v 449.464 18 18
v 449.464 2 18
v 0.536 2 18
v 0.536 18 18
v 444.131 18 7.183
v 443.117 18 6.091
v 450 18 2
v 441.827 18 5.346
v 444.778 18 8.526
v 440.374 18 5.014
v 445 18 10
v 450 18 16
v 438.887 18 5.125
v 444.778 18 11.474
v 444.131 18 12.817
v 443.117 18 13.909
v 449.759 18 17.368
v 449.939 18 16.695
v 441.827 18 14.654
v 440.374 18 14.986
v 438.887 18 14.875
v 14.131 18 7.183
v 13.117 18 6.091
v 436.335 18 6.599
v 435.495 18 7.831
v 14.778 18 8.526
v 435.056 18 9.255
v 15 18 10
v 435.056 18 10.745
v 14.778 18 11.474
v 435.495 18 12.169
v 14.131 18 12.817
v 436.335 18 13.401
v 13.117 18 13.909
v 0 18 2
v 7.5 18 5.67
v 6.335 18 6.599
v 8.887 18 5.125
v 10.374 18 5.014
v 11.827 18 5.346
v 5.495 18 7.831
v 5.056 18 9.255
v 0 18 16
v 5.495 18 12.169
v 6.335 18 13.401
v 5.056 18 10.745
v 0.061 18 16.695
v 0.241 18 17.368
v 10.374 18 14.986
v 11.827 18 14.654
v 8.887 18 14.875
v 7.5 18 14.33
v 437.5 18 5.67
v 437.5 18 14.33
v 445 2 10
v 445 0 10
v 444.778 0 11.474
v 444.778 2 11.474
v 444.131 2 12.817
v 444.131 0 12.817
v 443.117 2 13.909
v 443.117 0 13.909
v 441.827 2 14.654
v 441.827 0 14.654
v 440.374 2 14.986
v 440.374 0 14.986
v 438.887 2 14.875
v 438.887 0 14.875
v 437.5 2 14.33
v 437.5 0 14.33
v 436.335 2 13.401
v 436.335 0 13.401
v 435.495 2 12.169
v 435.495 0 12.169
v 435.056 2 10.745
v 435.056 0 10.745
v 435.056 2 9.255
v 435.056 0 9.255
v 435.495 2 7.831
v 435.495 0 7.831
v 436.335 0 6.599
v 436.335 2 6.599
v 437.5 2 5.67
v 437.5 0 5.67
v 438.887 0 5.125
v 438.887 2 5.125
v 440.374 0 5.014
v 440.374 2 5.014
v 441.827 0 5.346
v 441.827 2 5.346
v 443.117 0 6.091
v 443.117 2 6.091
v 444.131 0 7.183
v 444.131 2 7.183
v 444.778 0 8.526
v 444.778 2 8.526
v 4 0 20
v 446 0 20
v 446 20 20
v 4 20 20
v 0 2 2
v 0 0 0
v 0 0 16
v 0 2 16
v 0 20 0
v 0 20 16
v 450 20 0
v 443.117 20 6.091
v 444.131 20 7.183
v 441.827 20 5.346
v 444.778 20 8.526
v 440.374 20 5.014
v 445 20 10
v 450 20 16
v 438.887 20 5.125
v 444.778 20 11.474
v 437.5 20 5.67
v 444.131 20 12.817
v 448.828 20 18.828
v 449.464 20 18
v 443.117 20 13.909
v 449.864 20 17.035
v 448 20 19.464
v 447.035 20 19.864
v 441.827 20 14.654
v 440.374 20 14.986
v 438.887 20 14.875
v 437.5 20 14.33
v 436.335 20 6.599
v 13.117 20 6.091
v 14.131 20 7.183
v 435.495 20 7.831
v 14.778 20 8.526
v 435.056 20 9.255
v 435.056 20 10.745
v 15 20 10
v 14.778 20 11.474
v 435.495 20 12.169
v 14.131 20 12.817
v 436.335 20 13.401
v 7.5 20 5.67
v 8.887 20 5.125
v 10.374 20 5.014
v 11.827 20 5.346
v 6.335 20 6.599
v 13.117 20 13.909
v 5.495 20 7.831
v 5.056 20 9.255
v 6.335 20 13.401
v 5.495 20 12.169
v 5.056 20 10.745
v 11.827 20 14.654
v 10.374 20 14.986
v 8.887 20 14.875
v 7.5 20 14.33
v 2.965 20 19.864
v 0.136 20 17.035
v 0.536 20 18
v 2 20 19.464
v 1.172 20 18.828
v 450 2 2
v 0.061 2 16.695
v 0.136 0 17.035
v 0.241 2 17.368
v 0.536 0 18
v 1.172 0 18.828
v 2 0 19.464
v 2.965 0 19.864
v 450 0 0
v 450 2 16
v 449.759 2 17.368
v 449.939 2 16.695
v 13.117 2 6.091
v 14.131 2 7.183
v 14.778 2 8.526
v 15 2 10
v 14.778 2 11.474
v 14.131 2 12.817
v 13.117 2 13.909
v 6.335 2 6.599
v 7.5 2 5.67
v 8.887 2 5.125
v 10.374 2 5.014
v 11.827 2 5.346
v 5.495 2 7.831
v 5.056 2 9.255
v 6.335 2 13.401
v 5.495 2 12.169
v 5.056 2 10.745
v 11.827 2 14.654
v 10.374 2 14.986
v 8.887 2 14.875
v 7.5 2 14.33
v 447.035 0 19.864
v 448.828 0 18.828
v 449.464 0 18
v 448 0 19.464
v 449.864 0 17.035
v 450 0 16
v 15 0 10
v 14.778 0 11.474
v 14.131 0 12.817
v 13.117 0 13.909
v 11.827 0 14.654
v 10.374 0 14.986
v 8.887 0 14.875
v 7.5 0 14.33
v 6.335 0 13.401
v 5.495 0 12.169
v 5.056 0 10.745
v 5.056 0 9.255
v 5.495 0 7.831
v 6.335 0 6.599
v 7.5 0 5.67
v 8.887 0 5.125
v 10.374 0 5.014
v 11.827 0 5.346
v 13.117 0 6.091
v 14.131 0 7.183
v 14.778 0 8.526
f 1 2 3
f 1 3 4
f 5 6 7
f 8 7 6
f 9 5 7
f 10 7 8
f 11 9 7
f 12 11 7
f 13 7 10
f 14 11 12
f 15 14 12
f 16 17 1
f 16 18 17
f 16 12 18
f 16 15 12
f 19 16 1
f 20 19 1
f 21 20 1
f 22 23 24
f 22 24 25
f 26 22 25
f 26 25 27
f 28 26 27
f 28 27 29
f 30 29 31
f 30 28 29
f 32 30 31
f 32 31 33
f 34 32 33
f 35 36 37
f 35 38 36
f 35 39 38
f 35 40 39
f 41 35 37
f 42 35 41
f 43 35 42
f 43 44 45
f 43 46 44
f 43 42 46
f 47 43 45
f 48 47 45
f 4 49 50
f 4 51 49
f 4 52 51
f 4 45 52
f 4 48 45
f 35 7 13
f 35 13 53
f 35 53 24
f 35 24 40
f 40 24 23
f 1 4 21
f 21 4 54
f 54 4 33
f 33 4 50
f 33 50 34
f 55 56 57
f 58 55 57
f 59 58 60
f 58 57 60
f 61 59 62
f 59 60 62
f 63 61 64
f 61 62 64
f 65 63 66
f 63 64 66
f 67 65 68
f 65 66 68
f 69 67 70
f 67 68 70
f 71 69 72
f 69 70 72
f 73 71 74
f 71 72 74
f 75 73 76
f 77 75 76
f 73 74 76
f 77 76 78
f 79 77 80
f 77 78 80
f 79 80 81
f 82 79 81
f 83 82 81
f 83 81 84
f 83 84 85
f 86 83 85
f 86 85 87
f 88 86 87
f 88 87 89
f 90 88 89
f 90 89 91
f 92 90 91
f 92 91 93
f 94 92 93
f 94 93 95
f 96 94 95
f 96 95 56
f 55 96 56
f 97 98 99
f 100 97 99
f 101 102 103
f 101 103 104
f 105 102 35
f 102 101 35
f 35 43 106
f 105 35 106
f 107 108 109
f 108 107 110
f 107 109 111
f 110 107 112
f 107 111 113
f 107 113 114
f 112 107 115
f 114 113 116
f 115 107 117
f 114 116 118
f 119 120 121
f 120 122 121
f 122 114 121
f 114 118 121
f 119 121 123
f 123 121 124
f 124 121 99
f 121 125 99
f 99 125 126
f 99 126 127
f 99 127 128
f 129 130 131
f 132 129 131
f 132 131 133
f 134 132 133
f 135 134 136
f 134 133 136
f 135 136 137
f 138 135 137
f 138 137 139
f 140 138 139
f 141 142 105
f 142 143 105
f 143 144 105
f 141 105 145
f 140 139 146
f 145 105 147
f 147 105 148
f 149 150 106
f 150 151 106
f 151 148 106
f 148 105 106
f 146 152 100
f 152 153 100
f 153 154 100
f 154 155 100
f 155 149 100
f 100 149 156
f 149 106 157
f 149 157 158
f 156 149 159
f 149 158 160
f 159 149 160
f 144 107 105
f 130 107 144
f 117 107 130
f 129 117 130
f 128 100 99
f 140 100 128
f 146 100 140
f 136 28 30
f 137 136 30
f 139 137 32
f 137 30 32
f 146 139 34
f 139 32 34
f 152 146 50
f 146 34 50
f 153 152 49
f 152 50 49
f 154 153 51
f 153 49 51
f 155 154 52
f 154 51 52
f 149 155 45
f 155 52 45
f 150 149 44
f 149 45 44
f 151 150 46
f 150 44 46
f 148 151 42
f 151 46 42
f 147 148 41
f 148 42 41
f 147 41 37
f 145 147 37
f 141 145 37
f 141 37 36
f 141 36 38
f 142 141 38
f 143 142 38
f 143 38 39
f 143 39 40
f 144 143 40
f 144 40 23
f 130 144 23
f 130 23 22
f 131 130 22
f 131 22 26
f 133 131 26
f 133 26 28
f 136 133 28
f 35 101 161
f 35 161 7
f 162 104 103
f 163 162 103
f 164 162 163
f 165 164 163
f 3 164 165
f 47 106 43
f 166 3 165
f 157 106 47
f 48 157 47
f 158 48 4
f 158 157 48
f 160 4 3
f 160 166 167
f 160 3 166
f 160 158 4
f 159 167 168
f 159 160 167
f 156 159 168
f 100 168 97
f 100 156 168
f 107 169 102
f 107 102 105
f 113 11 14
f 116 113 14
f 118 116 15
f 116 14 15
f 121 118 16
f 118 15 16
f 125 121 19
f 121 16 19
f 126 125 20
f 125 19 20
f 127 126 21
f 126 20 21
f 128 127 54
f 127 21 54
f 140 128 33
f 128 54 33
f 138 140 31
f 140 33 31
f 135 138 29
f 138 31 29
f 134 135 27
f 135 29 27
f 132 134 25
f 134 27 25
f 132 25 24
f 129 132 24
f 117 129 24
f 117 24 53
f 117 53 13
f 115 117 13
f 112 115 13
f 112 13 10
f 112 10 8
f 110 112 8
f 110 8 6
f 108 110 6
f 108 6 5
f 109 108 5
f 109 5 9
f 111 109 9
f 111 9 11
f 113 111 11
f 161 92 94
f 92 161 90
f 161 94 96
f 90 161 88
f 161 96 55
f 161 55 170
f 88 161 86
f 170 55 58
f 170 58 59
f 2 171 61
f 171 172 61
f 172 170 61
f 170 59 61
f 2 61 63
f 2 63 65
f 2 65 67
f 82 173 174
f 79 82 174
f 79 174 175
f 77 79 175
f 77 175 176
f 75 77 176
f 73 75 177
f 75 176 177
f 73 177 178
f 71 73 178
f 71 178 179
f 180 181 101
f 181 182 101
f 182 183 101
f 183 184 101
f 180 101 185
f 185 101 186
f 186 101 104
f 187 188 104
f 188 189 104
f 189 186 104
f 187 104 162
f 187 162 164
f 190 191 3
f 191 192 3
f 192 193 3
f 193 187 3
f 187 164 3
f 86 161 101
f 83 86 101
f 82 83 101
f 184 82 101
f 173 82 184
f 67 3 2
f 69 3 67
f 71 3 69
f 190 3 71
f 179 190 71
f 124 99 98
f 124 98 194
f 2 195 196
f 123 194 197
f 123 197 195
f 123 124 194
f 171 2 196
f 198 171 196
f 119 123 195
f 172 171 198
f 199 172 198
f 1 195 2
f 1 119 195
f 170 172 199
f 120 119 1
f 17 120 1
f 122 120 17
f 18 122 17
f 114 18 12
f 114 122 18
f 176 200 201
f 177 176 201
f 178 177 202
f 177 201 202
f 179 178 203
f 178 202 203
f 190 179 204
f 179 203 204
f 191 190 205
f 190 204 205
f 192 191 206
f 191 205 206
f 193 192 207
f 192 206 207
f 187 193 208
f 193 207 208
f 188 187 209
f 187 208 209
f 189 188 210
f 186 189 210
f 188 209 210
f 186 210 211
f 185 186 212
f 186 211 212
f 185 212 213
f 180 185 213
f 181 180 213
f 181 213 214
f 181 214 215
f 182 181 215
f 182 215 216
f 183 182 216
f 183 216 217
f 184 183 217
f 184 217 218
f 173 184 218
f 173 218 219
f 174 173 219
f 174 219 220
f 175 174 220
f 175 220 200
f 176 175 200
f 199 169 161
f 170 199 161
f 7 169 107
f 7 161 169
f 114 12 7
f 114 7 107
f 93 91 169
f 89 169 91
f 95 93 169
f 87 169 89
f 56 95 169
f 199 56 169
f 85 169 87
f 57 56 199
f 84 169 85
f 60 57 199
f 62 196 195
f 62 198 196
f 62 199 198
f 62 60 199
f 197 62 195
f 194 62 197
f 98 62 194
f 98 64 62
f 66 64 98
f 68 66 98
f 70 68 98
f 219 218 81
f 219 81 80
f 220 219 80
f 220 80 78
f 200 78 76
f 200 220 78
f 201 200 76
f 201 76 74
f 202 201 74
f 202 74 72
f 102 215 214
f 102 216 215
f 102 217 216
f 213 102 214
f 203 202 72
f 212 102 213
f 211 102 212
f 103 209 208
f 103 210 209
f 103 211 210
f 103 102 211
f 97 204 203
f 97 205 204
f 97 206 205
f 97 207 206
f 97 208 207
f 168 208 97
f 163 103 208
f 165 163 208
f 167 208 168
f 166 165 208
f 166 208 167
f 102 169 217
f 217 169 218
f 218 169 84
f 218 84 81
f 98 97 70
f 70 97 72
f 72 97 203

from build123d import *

# Parameters (mm, degrees)
F0_W        = 20
F0_H        = 20
F0_W_2      = 16
F0_H_2      = 16
F1_DEPTH    = 450
F2_R        = 5
F3_DEPTH    = 20.001
F4_R        = 5
F5_DEPTH    = 20.001
F6_T1_DEPTH = 40
F7_T1_DEPTH = 40


# Not quite as in the source:
# - a fillet or chamfer that OpenCascade refuses, or shapes differently, is made with other operations: its cross-section is extruded or revolved along the edge and cut away or added


with BuildPart() as f1:
    # F0 (on Right) → F1 (new body)
    with BuildSketch(Plane.YZ):
        with Locations((10, 10)):
            Rectangle(F0_W, F0_H)
        with Locations((10, 10)):
            Rectangle(F0_W_2, F0_H_2, mode=Mode.SUBTRACT)
    extrude(amount=F1_DEPTH)

    # F2 (on face) → F3 (cut, through all)
    with BuildSketch(Plane.XZ):
        with Locations((440, 10)):
            Circle(F2_R)
    extrude(amount=-F3_DEPTH, mode=Mode.SUBTRACT)

    # F4 (on face) → F5 (cut, through all)
    with BuildSketch(Plane.XZ):
        with Locations((10, 10)):
            Circle(F4_R)
    extrude(amount=-F5_DEPTH, mode=Mode.SUBTRACT)

    # F6: fillet of radius 4 on 1 edges, made by hand

    # F6_s2 → F6_t1 (cut)
    with BuildSketch(Plane.XZ.offset(-30)):
        with BuildLine():
            ThreePointArc((446, 20), (448.8284271247, 18.8284271247), (450, 16))
            Line((450, 16), (450, 20))
            Line((450, 20), (446, 20))
        make_face()
    extrude(amount=F6_T1_DEPTH, mode=Mode.SUBTRACT)

    # F7: fillet of radius 4 on 1 edges, made by hand

    # F7_s2 → F7_t1 (cut)
    with BuildSketch(Plane.XZ.offset(-30)):
        with BuildLine():
            ThreePointArc((0, 16), (1.1715728753, 18.8284271247), (4, 20))
            Line((4, 20), (0, 20))
            Line((0, 20), (0, 16))
        make_face()
    extrude(amount=F7_T1_DEPTH, mode=Mode.SUBTRACT)


solid = f1.part
